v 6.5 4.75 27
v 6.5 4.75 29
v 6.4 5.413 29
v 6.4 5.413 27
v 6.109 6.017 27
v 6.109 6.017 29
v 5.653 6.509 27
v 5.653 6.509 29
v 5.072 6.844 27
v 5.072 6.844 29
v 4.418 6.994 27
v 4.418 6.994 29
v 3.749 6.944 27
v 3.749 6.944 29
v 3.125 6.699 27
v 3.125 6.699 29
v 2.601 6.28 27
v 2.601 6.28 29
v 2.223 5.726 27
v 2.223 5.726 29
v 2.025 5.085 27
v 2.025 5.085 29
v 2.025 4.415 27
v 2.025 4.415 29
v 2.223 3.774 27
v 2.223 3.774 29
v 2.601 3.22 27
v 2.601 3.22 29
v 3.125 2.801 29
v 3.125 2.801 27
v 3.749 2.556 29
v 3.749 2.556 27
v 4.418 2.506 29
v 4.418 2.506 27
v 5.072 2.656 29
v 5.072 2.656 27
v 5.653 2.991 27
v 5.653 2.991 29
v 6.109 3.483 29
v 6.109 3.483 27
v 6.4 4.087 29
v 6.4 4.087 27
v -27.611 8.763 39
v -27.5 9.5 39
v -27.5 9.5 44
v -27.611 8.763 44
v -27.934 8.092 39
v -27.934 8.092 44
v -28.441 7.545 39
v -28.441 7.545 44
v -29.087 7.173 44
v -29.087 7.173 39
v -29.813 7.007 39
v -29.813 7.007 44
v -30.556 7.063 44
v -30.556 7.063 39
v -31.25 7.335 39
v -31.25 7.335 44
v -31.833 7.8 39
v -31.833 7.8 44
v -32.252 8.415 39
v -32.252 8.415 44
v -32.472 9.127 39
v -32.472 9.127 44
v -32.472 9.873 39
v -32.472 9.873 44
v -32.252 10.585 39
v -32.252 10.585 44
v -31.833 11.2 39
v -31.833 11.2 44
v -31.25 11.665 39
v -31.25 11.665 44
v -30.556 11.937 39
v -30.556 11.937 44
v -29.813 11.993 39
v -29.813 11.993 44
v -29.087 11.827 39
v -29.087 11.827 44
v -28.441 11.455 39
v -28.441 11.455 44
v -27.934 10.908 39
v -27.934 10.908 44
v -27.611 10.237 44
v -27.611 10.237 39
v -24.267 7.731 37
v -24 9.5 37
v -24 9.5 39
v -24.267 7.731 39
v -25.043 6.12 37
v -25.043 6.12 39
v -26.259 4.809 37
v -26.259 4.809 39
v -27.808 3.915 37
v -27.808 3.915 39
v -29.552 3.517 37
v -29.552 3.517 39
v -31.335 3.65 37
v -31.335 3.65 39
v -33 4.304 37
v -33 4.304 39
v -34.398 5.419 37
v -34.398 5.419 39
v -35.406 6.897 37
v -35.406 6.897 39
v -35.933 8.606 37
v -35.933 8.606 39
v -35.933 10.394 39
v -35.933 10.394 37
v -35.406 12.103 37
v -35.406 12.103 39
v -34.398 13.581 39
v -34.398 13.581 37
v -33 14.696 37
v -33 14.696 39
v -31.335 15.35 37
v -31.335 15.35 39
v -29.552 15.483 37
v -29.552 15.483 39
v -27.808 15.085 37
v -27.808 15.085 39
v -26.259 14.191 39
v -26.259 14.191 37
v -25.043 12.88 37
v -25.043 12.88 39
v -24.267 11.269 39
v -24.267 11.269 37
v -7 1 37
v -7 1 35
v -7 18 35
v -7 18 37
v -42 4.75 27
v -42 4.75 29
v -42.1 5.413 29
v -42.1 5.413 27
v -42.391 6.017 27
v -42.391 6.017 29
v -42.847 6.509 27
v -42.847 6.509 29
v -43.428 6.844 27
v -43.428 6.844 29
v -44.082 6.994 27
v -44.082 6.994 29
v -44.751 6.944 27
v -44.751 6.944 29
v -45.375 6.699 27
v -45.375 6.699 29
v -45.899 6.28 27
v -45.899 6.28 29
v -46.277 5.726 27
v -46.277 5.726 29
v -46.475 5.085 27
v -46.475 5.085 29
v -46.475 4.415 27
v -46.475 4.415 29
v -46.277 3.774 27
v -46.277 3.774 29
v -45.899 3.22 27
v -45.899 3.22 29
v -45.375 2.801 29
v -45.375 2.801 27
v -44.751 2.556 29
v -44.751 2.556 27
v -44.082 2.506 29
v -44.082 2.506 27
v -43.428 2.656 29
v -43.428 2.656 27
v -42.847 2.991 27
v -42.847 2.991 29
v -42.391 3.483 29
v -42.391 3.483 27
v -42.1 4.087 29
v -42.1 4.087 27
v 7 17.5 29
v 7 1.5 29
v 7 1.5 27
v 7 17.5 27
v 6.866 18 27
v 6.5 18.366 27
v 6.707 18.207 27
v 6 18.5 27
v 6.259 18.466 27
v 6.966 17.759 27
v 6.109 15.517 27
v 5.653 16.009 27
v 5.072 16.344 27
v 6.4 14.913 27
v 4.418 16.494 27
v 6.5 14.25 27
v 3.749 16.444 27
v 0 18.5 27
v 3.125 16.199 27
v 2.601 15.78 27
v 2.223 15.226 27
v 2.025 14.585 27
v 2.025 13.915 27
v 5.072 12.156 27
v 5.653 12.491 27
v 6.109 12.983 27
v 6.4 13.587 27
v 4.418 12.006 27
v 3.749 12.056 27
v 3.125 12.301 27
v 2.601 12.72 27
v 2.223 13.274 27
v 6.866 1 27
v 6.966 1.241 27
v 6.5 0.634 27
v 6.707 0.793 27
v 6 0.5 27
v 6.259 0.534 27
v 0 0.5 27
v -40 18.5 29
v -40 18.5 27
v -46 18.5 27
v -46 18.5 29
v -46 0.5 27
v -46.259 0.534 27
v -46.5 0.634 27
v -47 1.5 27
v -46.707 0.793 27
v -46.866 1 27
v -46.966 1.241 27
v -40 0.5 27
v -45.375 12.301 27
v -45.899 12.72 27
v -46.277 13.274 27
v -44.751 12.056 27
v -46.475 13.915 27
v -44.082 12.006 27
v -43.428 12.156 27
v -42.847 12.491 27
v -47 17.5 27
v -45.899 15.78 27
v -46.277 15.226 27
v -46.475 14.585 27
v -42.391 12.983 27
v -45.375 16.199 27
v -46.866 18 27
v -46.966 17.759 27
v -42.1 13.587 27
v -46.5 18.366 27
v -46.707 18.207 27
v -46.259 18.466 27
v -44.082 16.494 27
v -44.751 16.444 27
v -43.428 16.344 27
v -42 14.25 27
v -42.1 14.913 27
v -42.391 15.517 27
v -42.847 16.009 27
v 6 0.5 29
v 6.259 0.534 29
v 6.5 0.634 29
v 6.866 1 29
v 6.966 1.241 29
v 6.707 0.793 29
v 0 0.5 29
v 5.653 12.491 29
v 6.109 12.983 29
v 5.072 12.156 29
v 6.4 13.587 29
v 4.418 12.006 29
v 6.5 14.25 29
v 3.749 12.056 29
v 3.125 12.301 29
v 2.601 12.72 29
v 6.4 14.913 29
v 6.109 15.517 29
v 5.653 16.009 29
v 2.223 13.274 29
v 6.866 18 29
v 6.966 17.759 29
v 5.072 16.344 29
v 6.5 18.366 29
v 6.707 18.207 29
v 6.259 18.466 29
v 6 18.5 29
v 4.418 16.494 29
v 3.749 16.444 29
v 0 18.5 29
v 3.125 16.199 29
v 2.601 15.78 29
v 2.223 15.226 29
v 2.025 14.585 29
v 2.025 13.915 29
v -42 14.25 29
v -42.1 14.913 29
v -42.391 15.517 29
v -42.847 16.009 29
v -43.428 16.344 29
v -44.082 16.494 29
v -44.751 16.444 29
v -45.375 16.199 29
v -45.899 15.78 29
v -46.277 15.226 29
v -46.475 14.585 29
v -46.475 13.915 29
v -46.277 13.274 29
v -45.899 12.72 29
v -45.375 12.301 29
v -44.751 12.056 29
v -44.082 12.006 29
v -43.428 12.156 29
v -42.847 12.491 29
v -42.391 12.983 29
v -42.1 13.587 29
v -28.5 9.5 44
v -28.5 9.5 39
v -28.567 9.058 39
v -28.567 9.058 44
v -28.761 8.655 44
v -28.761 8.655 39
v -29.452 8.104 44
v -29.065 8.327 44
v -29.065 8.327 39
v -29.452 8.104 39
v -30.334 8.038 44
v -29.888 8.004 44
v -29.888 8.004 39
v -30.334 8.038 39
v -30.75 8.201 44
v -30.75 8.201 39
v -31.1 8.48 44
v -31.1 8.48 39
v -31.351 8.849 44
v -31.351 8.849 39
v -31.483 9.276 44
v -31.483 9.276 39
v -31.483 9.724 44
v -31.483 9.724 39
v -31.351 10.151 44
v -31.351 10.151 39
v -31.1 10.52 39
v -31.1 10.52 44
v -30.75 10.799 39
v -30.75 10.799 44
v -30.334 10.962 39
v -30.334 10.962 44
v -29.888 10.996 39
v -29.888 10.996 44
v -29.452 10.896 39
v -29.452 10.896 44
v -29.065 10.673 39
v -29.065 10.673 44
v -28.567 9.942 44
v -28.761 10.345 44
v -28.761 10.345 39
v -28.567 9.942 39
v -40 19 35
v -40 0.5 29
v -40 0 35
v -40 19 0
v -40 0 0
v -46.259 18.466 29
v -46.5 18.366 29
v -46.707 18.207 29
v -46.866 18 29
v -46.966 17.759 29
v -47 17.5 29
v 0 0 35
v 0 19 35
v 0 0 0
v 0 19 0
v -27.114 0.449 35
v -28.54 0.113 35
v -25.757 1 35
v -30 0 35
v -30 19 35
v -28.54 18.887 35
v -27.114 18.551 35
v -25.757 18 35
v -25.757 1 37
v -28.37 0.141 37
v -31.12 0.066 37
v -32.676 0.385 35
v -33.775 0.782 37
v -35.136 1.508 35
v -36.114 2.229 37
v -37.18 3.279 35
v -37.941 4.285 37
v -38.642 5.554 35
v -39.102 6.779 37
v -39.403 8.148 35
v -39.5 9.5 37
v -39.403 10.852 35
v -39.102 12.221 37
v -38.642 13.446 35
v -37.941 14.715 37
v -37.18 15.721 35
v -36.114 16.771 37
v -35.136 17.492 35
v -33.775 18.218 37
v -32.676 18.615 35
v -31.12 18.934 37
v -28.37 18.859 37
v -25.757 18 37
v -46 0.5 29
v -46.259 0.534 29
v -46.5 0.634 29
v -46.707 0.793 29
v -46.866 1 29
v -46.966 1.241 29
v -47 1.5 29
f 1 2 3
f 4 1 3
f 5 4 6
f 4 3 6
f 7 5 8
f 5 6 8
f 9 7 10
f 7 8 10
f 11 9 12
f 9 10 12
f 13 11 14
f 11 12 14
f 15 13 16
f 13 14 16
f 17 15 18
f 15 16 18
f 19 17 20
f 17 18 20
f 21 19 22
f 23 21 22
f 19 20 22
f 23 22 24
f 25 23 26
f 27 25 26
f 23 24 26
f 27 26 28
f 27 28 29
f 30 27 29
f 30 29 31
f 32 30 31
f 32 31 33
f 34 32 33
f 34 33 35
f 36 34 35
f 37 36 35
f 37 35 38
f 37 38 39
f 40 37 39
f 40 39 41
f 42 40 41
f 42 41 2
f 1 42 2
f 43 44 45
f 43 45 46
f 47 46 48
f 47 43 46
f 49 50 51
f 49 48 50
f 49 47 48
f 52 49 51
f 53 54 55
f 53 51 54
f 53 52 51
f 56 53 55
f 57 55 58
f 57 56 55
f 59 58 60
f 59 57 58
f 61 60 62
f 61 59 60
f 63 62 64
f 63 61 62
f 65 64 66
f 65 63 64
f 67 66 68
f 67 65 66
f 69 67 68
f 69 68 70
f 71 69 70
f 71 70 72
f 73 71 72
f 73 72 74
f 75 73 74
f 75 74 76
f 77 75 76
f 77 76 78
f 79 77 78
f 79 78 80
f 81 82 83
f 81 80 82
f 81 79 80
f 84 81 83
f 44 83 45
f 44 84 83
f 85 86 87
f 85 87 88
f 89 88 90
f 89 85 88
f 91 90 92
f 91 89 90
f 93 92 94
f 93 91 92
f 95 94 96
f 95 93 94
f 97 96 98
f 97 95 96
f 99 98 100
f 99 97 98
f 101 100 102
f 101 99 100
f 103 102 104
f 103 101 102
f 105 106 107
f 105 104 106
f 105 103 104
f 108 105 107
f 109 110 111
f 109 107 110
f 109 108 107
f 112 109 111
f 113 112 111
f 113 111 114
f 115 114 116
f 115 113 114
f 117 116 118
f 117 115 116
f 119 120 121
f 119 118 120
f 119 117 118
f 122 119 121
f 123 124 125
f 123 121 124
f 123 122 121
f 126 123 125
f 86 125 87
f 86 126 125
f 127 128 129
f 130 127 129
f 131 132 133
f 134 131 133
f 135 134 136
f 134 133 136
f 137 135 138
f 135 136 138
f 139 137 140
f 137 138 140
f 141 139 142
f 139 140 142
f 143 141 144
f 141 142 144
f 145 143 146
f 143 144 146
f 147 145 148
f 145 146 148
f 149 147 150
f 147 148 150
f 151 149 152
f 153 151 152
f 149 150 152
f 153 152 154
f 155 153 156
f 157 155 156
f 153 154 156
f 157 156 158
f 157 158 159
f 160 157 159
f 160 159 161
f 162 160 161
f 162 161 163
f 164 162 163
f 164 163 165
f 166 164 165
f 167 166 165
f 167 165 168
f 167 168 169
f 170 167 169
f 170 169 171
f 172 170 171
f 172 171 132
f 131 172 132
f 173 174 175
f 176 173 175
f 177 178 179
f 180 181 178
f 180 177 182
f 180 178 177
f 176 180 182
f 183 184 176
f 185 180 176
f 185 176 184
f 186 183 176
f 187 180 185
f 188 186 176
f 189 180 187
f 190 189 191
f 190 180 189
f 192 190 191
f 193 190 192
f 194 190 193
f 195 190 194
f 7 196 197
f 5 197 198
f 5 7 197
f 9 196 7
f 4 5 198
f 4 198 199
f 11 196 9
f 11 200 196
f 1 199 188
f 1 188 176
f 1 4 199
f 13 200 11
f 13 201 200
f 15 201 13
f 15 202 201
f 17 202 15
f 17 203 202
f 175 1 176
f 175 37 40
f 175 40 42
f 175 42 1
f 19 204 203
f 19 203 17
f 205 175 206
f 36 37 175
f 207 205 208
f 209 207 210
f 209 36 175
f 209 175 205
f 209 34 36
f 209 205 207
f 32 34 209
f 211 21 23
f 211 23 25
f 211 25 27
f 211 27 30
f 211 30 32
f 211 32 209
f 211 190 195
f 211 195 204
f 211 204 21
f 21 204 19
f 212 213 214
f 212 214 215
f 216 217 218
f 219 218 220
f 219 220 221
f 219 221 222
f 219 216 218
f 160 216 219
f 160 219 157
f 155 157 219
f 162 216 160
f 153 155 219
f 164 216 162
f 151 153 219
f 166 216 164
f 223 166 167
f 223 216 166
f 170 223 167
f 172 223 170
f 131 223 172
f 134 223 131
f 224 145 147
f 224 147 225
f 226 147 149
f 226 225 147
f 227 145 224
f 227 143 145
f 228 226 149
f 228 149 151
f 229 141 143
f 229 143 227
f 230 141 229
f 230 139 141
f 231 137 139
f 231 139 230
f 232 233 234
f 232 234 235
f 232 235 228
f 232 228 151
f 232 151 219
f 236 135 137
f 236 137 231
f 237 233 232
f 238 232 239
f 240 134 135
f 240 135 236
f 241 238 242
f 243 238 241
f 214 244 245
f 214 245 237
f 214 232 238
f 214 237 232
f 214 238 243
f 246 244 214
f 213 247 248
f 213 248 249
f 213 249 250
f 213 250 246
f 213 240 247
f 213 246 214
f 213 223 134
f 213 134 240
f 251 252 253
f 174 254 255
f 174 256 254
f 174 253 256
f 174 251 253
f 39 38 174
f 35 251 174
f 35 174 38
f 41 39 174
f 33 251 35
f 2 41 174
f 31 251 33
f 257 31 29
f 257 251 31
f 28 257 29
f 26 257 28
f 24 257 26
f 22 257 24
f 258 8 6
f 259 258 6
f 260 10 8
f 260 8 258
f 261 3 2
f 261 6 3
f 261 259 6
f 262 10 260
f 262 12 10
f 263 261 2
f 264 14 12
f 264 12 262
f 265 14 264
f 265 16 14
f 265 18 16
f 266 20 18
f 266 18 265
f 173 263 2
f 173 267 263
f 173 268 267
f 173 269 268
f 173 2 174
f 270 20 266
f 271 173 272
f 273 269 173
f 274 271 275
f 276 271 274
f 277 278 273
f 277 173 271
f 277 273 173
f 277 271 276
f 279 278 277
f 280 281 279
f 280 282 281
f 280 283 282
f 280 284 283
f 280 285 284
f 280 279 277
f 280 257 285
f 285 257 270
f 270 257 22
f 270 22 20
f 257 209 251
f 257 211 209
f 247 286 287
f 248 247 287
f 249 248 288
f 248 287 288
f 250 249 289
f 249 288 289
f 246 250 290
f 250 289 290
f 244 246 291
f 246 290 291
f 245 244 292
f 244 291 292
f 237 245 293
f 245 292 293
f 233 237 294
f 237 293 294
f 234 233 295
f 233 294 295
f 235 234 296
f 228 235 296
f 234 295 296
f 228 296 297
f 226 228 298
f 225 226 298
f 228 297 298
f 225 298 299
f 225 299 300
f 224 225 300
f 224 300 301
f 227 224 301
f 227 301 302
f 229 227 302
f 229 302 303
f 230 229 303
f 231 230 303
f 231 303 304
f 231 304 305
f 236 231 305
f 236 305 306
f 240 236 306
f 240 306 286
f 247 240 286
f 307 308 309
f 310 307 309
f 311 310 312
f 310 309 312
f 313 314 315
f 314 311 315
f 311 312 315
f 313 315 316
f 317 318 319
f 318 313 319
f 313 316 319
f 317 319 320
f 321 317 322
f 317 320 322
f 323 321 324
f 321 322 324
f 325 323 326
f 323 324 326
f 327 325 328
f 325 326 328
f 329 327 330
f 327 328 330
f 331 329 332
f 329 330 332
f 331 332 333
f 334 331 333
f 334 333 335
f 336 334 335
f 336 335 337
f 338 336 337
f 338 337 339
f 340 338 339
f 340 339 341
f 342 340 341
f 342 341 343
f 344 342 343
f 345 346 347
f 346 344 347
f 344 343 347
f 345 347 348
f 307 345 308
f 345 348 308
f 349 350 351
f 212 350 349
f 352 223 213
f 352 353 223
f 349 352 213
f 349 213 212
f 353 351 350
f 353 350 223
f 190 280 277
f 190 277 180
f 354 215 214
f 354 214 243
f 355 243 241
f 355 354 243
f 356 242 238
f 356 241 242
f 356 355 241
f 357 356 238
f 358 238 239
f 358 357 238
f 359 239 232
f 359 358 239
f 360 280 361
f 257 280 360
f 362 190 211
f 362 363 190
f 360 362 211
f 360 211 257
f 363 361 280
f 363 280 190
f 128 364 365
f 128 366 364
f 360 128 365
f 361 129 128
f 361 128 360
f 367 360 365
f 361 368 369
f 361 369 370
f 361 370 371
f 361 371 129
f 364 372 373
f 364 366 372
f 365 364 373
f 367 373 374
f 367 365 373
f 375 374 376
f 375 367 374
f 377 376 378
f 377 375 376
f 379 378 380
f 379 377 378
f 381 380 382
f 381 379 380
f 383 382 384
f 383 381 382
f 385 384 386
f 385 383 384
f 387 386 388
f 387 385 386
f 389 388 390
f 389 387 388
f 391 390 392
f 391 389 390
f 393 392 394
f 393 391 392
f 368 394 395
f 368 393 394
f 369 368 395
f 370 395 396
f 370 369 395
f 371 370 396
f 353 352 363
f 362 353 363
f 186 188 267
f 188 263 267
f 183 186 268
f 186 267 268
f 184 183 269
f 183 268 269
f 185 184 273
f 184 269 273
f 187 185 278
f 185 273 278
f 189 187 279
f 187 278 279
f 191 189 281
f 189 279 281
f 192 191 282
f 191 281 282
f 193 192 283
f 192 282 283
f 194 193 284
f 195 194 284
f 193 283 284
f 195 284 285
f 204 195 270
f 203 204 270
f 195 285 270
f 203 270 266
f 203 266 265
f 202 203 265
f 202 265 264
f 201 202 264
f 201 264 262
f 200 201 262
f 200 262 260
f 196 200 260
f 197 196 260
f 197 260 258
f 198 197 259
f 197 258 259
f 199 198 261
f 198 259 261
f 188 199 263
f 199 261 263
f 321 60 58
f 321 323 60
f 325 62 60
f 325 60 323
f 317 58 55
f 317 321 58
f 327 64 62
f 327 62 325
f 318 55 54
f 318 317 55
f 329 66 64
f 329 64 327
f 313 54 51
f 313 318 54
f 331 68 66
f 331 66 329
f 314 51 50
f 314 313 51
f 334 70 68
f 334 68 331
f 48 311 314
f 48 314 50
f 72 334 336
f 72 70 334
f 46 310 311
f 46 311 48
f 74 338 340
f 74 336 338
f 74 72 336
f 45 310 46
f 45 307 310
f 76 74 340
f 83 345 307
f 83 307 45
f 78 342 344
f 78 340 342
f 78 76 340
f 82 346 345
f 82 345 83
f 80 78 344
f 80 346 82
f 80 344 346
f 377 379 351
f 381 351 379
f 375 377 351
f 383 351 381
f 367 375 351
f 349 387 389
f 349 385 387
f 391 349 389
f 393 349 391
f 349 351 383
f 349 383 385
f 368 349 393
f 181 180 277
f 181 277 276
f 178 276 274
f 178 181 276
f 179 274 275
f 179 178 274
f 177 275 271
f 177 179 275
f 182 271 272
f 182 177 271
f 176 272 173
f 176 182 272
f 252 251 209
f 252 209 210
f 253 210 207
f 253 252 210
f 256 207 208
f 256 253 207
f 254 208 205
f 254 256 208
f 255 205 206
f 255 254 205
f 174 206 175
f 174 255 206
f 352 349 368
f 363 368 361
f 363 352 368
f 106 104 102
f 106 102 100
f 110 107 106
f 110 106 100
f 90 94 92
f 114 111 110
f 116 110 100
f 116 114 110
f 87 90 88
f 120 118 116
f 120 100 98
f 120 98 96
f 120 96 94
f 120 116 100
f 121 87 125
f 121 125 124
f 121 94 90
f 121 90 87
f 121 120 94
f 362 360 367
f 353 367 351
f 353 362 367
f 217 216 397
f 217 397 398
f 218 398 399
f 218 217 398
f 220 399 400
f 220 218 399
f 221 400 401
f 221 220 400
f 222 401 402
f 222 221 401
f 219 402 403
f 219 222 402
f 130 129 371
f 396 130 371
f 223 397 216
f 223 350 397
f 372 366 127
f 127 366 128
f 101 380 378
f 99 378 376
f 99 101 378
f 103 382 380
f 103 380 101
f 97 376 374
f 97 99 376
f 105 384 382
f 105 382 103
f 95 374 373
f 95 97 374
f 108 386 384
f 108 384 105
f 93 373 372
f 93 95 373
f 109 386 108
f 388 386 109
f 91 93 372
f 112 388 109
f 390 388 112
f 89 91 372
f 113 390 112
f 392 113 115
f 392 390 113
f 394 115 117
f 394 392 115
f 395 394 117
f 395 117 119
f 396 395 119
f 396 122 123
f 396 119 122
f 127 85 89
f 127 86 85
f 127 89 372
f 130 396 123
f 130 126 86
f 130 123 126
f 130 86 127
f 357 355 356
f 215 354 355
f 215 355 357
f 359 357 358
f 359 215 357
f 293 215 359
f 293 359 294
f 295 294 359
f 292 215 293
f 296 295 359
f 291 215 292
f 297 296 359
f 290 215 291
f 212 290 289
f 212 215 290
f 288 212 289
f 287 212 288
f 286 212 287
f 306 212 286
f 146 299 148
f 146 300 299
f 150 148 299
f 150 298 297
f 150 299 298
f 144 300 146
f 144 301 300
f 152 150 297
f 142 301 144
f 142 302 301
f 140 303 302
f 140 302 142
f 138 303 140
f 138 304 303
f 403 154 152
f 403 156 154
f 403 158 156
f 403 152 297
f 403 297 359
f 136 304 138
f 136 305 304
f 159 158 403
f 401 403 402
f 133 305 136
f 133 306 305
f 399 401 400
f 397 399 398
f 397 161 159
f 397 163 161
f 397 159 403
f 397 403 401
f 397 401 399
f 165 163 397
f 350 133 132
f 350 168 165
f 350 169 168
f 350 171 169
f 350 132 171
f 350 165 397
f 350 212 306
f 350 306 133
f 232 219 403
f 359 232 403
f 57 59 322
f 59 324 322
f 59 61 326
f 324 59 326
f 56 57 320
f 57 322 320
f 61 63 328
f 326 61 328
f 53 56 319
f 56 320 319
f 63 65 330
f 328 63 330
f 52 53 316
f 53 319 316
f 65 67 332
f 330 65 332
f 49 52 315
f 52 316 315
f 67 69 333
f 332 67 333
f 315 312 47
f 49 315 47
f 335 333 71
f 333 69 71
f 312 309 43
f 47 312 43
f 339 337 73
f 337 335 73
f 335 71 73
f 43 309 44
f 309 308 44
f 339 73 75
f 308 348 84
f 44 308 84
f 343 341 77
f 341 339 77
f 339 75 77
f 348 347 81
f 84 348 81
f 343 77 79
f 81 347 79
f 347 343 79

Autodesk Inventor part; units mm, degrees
ref_plane "YZ Plane" through (0, 0, 0) normal (1, 0, 0) x (0, 1, 0)
ref_plane "XZ Plane" through (0, 0, 0) normal (0, 1, 0) x (-1, 0, 0)
ref_plane "XY Plane" through (0, 0, 0) normal (0, 0, 1) x (1, 0, 0)
sketch "Skizze1" plane through (0, 0, 0) normal (0, 0, 1) x (1, 0, 0)
  line L0 (0, 0) -> (-40, 0)
  line L1 (-40, 0) -> (-40, 19)
  line L2 (-40, 19) -> (0, 19)
  line L3 (0, 19) -> (0, 0)
  dimension "d0" = 40
  dimension "d1" = 19
extrude "Extrusion1" add sketch "Skizze1" along normal blind 35
sketch "Skizze2" plane through (0, 0, 35) normal (0, 0, 1) x (1, 0, 0)
  line L0 (-40, 19) -> (0, 19) projected
  circle A0 centre (-30, 9.5) radius 9.5
  dimension "d4" = 10
extrude "Extrusion2" add sketch "Skizze2" along normal blind 2
sketch "Skizze3" plane through (0, 0, 35) normal (0, 0, 1) x (1, 0, 0)
  line L0 (0, 19) -> (0, 0) projected
  line L1 (-37, 3.6605) -> (-37, 17.3389)
  line L2 (-7, 1) -> (-7, 18)
  line L3 (-7, 18) -> (-30, 18)
  line L4 (-30, 18) -> (-30, 1)
  line L5 (-30, 1) -> (-7, 1)
  dimension "d13" = 17
extrude "Extrusion3" add sketch "Skizze3" along normal blind 2
sketch "Skizze4" plane through (0, 0, 37) normal (0, 0, 1) x (1, 0, 0)
  arc A0 (-25.7574, 18) -> (-25.7574, 1) centre (-30, 9.5) ccw projected
  circle A1 centre (-30, 9.5) radius 6
  point P0 (0, 0)
  dimension "d16" = 12
extrude "Extrusion4" add sketch "Skizze4" along normal blind 2
sketch "Skizze6" plane through (-40, 0, 0) normal (-1, 0, 0) x (0, 0, 1)
  line L0 (27, 18.5) -> (29, 18.5)
  line L1 (29, 18.5) -> (29, 0.5)
  line L2 (29, 0.5) -> (27, 0.5)
  line L3 (27, 0.5) -> (27, 18.5)
  dimension "d23" = 2
  dimension "d24" = 18
extrude "Extrusion5" add sketch "Skizze6" along normal blind 7
sketch "Skizze7" plane through (-40, 0.5, 29) normal (0, 0, 1) x (1, 0, 0)
  circle A0 centre (-4.25, 4.25) radius 2.25
  circle A1 centre (-4.25, 13.75) radius 2.25
  point P0 (40, -0.5)
  dimension "d27" = 4.5
  dimension "d28" = 4.5
extrude "Extrusion6" cut sketch "Skizze7" against normal blind 2 contours A0
sketch "Skizze8" plane through (-40, 0.5, 29) normal (0, 0, 1) x (1, 0, 0)
  circle A0 centre (-4.25, 13.75) radius 2.25
  point P0 (40, -0.5)
  dimension "d31" = 4.5
extrude "Extrusion7" cut sketch "Skizze8" against normal blind 2
fillet "Rundung1" radius 1 1 edges at (-47, 0.5, 28)
fillet "Rundung2" radius 1 1 edges at (-47, 18.5, 28)
sketch "Skizze9" plane through (0, 0, 0) normal (1, 0, 0) x (0, 0, -1)
  line L0 (-27, 0.5) -> (-29, 0.5)
  line L1 (-29, 0.5) -> (-29, 18.5)
  line L2 (-29, 18.5) -> (-27, 18.5)
  line L3 (-27, 18.5) -> (-27, 0.5)
  dimension "d36" = 2
  dimension "d37" = 18
extrude "Extrusion8" add sketch "Skizze9" along normal blind 7
sketch "Skizze10" plane through (0, 0.5, 29) normal (0, 0, 1) x (1, 0, 0)
  circle A0 centre (4.25, 4.25) radius 2.25
  point P0 (0, -0.5)
  dimension "d40" = 4.5
extrude "Extrusion9" cut sketch "Skizze10" against normal blind 2
sketch "Skizze11" plane through (0, 0.5, 29) normal (0, 0, 1) x (1, 0, 0)
  circle A0 centre (4.25, 13.75) radius 2.25
  point P0 (0, -0.5)
  dimension "d43" = 4.5
extrude "Extrusion10" cut sketch "Skizze11" against normal blind 2
fillet "Rundung3" radius 1 1 edges at (7, 18.5, 28)
fillet "Rundung4" radius 1 1 edges at (7, 0.5, 28)
sketch "Skizze12" plane through (-30, 9.5, 39) normal (0, 0, 1) x (1, 0, 0)
  circle A0 centre (0, 0) radius 6 projected
  circle A1 centre (0, 0) radius 1.5
  circle A2 centre (0, 0) radius 2.5
  point P0 (30, -9.5)
  dimension "d48" = 3
  dimension "d49" = 5
extrude "Extrusion11" add sketch "Skizze12" along normal blind 5 separate body contours A2
ref_plane "Arbeitsebene1" through (-40, 9.5, 0) normal (0, 1, 0) x (1, 0, 0)
properties part number "servo" material "PC/ABS-Kunststoff"
